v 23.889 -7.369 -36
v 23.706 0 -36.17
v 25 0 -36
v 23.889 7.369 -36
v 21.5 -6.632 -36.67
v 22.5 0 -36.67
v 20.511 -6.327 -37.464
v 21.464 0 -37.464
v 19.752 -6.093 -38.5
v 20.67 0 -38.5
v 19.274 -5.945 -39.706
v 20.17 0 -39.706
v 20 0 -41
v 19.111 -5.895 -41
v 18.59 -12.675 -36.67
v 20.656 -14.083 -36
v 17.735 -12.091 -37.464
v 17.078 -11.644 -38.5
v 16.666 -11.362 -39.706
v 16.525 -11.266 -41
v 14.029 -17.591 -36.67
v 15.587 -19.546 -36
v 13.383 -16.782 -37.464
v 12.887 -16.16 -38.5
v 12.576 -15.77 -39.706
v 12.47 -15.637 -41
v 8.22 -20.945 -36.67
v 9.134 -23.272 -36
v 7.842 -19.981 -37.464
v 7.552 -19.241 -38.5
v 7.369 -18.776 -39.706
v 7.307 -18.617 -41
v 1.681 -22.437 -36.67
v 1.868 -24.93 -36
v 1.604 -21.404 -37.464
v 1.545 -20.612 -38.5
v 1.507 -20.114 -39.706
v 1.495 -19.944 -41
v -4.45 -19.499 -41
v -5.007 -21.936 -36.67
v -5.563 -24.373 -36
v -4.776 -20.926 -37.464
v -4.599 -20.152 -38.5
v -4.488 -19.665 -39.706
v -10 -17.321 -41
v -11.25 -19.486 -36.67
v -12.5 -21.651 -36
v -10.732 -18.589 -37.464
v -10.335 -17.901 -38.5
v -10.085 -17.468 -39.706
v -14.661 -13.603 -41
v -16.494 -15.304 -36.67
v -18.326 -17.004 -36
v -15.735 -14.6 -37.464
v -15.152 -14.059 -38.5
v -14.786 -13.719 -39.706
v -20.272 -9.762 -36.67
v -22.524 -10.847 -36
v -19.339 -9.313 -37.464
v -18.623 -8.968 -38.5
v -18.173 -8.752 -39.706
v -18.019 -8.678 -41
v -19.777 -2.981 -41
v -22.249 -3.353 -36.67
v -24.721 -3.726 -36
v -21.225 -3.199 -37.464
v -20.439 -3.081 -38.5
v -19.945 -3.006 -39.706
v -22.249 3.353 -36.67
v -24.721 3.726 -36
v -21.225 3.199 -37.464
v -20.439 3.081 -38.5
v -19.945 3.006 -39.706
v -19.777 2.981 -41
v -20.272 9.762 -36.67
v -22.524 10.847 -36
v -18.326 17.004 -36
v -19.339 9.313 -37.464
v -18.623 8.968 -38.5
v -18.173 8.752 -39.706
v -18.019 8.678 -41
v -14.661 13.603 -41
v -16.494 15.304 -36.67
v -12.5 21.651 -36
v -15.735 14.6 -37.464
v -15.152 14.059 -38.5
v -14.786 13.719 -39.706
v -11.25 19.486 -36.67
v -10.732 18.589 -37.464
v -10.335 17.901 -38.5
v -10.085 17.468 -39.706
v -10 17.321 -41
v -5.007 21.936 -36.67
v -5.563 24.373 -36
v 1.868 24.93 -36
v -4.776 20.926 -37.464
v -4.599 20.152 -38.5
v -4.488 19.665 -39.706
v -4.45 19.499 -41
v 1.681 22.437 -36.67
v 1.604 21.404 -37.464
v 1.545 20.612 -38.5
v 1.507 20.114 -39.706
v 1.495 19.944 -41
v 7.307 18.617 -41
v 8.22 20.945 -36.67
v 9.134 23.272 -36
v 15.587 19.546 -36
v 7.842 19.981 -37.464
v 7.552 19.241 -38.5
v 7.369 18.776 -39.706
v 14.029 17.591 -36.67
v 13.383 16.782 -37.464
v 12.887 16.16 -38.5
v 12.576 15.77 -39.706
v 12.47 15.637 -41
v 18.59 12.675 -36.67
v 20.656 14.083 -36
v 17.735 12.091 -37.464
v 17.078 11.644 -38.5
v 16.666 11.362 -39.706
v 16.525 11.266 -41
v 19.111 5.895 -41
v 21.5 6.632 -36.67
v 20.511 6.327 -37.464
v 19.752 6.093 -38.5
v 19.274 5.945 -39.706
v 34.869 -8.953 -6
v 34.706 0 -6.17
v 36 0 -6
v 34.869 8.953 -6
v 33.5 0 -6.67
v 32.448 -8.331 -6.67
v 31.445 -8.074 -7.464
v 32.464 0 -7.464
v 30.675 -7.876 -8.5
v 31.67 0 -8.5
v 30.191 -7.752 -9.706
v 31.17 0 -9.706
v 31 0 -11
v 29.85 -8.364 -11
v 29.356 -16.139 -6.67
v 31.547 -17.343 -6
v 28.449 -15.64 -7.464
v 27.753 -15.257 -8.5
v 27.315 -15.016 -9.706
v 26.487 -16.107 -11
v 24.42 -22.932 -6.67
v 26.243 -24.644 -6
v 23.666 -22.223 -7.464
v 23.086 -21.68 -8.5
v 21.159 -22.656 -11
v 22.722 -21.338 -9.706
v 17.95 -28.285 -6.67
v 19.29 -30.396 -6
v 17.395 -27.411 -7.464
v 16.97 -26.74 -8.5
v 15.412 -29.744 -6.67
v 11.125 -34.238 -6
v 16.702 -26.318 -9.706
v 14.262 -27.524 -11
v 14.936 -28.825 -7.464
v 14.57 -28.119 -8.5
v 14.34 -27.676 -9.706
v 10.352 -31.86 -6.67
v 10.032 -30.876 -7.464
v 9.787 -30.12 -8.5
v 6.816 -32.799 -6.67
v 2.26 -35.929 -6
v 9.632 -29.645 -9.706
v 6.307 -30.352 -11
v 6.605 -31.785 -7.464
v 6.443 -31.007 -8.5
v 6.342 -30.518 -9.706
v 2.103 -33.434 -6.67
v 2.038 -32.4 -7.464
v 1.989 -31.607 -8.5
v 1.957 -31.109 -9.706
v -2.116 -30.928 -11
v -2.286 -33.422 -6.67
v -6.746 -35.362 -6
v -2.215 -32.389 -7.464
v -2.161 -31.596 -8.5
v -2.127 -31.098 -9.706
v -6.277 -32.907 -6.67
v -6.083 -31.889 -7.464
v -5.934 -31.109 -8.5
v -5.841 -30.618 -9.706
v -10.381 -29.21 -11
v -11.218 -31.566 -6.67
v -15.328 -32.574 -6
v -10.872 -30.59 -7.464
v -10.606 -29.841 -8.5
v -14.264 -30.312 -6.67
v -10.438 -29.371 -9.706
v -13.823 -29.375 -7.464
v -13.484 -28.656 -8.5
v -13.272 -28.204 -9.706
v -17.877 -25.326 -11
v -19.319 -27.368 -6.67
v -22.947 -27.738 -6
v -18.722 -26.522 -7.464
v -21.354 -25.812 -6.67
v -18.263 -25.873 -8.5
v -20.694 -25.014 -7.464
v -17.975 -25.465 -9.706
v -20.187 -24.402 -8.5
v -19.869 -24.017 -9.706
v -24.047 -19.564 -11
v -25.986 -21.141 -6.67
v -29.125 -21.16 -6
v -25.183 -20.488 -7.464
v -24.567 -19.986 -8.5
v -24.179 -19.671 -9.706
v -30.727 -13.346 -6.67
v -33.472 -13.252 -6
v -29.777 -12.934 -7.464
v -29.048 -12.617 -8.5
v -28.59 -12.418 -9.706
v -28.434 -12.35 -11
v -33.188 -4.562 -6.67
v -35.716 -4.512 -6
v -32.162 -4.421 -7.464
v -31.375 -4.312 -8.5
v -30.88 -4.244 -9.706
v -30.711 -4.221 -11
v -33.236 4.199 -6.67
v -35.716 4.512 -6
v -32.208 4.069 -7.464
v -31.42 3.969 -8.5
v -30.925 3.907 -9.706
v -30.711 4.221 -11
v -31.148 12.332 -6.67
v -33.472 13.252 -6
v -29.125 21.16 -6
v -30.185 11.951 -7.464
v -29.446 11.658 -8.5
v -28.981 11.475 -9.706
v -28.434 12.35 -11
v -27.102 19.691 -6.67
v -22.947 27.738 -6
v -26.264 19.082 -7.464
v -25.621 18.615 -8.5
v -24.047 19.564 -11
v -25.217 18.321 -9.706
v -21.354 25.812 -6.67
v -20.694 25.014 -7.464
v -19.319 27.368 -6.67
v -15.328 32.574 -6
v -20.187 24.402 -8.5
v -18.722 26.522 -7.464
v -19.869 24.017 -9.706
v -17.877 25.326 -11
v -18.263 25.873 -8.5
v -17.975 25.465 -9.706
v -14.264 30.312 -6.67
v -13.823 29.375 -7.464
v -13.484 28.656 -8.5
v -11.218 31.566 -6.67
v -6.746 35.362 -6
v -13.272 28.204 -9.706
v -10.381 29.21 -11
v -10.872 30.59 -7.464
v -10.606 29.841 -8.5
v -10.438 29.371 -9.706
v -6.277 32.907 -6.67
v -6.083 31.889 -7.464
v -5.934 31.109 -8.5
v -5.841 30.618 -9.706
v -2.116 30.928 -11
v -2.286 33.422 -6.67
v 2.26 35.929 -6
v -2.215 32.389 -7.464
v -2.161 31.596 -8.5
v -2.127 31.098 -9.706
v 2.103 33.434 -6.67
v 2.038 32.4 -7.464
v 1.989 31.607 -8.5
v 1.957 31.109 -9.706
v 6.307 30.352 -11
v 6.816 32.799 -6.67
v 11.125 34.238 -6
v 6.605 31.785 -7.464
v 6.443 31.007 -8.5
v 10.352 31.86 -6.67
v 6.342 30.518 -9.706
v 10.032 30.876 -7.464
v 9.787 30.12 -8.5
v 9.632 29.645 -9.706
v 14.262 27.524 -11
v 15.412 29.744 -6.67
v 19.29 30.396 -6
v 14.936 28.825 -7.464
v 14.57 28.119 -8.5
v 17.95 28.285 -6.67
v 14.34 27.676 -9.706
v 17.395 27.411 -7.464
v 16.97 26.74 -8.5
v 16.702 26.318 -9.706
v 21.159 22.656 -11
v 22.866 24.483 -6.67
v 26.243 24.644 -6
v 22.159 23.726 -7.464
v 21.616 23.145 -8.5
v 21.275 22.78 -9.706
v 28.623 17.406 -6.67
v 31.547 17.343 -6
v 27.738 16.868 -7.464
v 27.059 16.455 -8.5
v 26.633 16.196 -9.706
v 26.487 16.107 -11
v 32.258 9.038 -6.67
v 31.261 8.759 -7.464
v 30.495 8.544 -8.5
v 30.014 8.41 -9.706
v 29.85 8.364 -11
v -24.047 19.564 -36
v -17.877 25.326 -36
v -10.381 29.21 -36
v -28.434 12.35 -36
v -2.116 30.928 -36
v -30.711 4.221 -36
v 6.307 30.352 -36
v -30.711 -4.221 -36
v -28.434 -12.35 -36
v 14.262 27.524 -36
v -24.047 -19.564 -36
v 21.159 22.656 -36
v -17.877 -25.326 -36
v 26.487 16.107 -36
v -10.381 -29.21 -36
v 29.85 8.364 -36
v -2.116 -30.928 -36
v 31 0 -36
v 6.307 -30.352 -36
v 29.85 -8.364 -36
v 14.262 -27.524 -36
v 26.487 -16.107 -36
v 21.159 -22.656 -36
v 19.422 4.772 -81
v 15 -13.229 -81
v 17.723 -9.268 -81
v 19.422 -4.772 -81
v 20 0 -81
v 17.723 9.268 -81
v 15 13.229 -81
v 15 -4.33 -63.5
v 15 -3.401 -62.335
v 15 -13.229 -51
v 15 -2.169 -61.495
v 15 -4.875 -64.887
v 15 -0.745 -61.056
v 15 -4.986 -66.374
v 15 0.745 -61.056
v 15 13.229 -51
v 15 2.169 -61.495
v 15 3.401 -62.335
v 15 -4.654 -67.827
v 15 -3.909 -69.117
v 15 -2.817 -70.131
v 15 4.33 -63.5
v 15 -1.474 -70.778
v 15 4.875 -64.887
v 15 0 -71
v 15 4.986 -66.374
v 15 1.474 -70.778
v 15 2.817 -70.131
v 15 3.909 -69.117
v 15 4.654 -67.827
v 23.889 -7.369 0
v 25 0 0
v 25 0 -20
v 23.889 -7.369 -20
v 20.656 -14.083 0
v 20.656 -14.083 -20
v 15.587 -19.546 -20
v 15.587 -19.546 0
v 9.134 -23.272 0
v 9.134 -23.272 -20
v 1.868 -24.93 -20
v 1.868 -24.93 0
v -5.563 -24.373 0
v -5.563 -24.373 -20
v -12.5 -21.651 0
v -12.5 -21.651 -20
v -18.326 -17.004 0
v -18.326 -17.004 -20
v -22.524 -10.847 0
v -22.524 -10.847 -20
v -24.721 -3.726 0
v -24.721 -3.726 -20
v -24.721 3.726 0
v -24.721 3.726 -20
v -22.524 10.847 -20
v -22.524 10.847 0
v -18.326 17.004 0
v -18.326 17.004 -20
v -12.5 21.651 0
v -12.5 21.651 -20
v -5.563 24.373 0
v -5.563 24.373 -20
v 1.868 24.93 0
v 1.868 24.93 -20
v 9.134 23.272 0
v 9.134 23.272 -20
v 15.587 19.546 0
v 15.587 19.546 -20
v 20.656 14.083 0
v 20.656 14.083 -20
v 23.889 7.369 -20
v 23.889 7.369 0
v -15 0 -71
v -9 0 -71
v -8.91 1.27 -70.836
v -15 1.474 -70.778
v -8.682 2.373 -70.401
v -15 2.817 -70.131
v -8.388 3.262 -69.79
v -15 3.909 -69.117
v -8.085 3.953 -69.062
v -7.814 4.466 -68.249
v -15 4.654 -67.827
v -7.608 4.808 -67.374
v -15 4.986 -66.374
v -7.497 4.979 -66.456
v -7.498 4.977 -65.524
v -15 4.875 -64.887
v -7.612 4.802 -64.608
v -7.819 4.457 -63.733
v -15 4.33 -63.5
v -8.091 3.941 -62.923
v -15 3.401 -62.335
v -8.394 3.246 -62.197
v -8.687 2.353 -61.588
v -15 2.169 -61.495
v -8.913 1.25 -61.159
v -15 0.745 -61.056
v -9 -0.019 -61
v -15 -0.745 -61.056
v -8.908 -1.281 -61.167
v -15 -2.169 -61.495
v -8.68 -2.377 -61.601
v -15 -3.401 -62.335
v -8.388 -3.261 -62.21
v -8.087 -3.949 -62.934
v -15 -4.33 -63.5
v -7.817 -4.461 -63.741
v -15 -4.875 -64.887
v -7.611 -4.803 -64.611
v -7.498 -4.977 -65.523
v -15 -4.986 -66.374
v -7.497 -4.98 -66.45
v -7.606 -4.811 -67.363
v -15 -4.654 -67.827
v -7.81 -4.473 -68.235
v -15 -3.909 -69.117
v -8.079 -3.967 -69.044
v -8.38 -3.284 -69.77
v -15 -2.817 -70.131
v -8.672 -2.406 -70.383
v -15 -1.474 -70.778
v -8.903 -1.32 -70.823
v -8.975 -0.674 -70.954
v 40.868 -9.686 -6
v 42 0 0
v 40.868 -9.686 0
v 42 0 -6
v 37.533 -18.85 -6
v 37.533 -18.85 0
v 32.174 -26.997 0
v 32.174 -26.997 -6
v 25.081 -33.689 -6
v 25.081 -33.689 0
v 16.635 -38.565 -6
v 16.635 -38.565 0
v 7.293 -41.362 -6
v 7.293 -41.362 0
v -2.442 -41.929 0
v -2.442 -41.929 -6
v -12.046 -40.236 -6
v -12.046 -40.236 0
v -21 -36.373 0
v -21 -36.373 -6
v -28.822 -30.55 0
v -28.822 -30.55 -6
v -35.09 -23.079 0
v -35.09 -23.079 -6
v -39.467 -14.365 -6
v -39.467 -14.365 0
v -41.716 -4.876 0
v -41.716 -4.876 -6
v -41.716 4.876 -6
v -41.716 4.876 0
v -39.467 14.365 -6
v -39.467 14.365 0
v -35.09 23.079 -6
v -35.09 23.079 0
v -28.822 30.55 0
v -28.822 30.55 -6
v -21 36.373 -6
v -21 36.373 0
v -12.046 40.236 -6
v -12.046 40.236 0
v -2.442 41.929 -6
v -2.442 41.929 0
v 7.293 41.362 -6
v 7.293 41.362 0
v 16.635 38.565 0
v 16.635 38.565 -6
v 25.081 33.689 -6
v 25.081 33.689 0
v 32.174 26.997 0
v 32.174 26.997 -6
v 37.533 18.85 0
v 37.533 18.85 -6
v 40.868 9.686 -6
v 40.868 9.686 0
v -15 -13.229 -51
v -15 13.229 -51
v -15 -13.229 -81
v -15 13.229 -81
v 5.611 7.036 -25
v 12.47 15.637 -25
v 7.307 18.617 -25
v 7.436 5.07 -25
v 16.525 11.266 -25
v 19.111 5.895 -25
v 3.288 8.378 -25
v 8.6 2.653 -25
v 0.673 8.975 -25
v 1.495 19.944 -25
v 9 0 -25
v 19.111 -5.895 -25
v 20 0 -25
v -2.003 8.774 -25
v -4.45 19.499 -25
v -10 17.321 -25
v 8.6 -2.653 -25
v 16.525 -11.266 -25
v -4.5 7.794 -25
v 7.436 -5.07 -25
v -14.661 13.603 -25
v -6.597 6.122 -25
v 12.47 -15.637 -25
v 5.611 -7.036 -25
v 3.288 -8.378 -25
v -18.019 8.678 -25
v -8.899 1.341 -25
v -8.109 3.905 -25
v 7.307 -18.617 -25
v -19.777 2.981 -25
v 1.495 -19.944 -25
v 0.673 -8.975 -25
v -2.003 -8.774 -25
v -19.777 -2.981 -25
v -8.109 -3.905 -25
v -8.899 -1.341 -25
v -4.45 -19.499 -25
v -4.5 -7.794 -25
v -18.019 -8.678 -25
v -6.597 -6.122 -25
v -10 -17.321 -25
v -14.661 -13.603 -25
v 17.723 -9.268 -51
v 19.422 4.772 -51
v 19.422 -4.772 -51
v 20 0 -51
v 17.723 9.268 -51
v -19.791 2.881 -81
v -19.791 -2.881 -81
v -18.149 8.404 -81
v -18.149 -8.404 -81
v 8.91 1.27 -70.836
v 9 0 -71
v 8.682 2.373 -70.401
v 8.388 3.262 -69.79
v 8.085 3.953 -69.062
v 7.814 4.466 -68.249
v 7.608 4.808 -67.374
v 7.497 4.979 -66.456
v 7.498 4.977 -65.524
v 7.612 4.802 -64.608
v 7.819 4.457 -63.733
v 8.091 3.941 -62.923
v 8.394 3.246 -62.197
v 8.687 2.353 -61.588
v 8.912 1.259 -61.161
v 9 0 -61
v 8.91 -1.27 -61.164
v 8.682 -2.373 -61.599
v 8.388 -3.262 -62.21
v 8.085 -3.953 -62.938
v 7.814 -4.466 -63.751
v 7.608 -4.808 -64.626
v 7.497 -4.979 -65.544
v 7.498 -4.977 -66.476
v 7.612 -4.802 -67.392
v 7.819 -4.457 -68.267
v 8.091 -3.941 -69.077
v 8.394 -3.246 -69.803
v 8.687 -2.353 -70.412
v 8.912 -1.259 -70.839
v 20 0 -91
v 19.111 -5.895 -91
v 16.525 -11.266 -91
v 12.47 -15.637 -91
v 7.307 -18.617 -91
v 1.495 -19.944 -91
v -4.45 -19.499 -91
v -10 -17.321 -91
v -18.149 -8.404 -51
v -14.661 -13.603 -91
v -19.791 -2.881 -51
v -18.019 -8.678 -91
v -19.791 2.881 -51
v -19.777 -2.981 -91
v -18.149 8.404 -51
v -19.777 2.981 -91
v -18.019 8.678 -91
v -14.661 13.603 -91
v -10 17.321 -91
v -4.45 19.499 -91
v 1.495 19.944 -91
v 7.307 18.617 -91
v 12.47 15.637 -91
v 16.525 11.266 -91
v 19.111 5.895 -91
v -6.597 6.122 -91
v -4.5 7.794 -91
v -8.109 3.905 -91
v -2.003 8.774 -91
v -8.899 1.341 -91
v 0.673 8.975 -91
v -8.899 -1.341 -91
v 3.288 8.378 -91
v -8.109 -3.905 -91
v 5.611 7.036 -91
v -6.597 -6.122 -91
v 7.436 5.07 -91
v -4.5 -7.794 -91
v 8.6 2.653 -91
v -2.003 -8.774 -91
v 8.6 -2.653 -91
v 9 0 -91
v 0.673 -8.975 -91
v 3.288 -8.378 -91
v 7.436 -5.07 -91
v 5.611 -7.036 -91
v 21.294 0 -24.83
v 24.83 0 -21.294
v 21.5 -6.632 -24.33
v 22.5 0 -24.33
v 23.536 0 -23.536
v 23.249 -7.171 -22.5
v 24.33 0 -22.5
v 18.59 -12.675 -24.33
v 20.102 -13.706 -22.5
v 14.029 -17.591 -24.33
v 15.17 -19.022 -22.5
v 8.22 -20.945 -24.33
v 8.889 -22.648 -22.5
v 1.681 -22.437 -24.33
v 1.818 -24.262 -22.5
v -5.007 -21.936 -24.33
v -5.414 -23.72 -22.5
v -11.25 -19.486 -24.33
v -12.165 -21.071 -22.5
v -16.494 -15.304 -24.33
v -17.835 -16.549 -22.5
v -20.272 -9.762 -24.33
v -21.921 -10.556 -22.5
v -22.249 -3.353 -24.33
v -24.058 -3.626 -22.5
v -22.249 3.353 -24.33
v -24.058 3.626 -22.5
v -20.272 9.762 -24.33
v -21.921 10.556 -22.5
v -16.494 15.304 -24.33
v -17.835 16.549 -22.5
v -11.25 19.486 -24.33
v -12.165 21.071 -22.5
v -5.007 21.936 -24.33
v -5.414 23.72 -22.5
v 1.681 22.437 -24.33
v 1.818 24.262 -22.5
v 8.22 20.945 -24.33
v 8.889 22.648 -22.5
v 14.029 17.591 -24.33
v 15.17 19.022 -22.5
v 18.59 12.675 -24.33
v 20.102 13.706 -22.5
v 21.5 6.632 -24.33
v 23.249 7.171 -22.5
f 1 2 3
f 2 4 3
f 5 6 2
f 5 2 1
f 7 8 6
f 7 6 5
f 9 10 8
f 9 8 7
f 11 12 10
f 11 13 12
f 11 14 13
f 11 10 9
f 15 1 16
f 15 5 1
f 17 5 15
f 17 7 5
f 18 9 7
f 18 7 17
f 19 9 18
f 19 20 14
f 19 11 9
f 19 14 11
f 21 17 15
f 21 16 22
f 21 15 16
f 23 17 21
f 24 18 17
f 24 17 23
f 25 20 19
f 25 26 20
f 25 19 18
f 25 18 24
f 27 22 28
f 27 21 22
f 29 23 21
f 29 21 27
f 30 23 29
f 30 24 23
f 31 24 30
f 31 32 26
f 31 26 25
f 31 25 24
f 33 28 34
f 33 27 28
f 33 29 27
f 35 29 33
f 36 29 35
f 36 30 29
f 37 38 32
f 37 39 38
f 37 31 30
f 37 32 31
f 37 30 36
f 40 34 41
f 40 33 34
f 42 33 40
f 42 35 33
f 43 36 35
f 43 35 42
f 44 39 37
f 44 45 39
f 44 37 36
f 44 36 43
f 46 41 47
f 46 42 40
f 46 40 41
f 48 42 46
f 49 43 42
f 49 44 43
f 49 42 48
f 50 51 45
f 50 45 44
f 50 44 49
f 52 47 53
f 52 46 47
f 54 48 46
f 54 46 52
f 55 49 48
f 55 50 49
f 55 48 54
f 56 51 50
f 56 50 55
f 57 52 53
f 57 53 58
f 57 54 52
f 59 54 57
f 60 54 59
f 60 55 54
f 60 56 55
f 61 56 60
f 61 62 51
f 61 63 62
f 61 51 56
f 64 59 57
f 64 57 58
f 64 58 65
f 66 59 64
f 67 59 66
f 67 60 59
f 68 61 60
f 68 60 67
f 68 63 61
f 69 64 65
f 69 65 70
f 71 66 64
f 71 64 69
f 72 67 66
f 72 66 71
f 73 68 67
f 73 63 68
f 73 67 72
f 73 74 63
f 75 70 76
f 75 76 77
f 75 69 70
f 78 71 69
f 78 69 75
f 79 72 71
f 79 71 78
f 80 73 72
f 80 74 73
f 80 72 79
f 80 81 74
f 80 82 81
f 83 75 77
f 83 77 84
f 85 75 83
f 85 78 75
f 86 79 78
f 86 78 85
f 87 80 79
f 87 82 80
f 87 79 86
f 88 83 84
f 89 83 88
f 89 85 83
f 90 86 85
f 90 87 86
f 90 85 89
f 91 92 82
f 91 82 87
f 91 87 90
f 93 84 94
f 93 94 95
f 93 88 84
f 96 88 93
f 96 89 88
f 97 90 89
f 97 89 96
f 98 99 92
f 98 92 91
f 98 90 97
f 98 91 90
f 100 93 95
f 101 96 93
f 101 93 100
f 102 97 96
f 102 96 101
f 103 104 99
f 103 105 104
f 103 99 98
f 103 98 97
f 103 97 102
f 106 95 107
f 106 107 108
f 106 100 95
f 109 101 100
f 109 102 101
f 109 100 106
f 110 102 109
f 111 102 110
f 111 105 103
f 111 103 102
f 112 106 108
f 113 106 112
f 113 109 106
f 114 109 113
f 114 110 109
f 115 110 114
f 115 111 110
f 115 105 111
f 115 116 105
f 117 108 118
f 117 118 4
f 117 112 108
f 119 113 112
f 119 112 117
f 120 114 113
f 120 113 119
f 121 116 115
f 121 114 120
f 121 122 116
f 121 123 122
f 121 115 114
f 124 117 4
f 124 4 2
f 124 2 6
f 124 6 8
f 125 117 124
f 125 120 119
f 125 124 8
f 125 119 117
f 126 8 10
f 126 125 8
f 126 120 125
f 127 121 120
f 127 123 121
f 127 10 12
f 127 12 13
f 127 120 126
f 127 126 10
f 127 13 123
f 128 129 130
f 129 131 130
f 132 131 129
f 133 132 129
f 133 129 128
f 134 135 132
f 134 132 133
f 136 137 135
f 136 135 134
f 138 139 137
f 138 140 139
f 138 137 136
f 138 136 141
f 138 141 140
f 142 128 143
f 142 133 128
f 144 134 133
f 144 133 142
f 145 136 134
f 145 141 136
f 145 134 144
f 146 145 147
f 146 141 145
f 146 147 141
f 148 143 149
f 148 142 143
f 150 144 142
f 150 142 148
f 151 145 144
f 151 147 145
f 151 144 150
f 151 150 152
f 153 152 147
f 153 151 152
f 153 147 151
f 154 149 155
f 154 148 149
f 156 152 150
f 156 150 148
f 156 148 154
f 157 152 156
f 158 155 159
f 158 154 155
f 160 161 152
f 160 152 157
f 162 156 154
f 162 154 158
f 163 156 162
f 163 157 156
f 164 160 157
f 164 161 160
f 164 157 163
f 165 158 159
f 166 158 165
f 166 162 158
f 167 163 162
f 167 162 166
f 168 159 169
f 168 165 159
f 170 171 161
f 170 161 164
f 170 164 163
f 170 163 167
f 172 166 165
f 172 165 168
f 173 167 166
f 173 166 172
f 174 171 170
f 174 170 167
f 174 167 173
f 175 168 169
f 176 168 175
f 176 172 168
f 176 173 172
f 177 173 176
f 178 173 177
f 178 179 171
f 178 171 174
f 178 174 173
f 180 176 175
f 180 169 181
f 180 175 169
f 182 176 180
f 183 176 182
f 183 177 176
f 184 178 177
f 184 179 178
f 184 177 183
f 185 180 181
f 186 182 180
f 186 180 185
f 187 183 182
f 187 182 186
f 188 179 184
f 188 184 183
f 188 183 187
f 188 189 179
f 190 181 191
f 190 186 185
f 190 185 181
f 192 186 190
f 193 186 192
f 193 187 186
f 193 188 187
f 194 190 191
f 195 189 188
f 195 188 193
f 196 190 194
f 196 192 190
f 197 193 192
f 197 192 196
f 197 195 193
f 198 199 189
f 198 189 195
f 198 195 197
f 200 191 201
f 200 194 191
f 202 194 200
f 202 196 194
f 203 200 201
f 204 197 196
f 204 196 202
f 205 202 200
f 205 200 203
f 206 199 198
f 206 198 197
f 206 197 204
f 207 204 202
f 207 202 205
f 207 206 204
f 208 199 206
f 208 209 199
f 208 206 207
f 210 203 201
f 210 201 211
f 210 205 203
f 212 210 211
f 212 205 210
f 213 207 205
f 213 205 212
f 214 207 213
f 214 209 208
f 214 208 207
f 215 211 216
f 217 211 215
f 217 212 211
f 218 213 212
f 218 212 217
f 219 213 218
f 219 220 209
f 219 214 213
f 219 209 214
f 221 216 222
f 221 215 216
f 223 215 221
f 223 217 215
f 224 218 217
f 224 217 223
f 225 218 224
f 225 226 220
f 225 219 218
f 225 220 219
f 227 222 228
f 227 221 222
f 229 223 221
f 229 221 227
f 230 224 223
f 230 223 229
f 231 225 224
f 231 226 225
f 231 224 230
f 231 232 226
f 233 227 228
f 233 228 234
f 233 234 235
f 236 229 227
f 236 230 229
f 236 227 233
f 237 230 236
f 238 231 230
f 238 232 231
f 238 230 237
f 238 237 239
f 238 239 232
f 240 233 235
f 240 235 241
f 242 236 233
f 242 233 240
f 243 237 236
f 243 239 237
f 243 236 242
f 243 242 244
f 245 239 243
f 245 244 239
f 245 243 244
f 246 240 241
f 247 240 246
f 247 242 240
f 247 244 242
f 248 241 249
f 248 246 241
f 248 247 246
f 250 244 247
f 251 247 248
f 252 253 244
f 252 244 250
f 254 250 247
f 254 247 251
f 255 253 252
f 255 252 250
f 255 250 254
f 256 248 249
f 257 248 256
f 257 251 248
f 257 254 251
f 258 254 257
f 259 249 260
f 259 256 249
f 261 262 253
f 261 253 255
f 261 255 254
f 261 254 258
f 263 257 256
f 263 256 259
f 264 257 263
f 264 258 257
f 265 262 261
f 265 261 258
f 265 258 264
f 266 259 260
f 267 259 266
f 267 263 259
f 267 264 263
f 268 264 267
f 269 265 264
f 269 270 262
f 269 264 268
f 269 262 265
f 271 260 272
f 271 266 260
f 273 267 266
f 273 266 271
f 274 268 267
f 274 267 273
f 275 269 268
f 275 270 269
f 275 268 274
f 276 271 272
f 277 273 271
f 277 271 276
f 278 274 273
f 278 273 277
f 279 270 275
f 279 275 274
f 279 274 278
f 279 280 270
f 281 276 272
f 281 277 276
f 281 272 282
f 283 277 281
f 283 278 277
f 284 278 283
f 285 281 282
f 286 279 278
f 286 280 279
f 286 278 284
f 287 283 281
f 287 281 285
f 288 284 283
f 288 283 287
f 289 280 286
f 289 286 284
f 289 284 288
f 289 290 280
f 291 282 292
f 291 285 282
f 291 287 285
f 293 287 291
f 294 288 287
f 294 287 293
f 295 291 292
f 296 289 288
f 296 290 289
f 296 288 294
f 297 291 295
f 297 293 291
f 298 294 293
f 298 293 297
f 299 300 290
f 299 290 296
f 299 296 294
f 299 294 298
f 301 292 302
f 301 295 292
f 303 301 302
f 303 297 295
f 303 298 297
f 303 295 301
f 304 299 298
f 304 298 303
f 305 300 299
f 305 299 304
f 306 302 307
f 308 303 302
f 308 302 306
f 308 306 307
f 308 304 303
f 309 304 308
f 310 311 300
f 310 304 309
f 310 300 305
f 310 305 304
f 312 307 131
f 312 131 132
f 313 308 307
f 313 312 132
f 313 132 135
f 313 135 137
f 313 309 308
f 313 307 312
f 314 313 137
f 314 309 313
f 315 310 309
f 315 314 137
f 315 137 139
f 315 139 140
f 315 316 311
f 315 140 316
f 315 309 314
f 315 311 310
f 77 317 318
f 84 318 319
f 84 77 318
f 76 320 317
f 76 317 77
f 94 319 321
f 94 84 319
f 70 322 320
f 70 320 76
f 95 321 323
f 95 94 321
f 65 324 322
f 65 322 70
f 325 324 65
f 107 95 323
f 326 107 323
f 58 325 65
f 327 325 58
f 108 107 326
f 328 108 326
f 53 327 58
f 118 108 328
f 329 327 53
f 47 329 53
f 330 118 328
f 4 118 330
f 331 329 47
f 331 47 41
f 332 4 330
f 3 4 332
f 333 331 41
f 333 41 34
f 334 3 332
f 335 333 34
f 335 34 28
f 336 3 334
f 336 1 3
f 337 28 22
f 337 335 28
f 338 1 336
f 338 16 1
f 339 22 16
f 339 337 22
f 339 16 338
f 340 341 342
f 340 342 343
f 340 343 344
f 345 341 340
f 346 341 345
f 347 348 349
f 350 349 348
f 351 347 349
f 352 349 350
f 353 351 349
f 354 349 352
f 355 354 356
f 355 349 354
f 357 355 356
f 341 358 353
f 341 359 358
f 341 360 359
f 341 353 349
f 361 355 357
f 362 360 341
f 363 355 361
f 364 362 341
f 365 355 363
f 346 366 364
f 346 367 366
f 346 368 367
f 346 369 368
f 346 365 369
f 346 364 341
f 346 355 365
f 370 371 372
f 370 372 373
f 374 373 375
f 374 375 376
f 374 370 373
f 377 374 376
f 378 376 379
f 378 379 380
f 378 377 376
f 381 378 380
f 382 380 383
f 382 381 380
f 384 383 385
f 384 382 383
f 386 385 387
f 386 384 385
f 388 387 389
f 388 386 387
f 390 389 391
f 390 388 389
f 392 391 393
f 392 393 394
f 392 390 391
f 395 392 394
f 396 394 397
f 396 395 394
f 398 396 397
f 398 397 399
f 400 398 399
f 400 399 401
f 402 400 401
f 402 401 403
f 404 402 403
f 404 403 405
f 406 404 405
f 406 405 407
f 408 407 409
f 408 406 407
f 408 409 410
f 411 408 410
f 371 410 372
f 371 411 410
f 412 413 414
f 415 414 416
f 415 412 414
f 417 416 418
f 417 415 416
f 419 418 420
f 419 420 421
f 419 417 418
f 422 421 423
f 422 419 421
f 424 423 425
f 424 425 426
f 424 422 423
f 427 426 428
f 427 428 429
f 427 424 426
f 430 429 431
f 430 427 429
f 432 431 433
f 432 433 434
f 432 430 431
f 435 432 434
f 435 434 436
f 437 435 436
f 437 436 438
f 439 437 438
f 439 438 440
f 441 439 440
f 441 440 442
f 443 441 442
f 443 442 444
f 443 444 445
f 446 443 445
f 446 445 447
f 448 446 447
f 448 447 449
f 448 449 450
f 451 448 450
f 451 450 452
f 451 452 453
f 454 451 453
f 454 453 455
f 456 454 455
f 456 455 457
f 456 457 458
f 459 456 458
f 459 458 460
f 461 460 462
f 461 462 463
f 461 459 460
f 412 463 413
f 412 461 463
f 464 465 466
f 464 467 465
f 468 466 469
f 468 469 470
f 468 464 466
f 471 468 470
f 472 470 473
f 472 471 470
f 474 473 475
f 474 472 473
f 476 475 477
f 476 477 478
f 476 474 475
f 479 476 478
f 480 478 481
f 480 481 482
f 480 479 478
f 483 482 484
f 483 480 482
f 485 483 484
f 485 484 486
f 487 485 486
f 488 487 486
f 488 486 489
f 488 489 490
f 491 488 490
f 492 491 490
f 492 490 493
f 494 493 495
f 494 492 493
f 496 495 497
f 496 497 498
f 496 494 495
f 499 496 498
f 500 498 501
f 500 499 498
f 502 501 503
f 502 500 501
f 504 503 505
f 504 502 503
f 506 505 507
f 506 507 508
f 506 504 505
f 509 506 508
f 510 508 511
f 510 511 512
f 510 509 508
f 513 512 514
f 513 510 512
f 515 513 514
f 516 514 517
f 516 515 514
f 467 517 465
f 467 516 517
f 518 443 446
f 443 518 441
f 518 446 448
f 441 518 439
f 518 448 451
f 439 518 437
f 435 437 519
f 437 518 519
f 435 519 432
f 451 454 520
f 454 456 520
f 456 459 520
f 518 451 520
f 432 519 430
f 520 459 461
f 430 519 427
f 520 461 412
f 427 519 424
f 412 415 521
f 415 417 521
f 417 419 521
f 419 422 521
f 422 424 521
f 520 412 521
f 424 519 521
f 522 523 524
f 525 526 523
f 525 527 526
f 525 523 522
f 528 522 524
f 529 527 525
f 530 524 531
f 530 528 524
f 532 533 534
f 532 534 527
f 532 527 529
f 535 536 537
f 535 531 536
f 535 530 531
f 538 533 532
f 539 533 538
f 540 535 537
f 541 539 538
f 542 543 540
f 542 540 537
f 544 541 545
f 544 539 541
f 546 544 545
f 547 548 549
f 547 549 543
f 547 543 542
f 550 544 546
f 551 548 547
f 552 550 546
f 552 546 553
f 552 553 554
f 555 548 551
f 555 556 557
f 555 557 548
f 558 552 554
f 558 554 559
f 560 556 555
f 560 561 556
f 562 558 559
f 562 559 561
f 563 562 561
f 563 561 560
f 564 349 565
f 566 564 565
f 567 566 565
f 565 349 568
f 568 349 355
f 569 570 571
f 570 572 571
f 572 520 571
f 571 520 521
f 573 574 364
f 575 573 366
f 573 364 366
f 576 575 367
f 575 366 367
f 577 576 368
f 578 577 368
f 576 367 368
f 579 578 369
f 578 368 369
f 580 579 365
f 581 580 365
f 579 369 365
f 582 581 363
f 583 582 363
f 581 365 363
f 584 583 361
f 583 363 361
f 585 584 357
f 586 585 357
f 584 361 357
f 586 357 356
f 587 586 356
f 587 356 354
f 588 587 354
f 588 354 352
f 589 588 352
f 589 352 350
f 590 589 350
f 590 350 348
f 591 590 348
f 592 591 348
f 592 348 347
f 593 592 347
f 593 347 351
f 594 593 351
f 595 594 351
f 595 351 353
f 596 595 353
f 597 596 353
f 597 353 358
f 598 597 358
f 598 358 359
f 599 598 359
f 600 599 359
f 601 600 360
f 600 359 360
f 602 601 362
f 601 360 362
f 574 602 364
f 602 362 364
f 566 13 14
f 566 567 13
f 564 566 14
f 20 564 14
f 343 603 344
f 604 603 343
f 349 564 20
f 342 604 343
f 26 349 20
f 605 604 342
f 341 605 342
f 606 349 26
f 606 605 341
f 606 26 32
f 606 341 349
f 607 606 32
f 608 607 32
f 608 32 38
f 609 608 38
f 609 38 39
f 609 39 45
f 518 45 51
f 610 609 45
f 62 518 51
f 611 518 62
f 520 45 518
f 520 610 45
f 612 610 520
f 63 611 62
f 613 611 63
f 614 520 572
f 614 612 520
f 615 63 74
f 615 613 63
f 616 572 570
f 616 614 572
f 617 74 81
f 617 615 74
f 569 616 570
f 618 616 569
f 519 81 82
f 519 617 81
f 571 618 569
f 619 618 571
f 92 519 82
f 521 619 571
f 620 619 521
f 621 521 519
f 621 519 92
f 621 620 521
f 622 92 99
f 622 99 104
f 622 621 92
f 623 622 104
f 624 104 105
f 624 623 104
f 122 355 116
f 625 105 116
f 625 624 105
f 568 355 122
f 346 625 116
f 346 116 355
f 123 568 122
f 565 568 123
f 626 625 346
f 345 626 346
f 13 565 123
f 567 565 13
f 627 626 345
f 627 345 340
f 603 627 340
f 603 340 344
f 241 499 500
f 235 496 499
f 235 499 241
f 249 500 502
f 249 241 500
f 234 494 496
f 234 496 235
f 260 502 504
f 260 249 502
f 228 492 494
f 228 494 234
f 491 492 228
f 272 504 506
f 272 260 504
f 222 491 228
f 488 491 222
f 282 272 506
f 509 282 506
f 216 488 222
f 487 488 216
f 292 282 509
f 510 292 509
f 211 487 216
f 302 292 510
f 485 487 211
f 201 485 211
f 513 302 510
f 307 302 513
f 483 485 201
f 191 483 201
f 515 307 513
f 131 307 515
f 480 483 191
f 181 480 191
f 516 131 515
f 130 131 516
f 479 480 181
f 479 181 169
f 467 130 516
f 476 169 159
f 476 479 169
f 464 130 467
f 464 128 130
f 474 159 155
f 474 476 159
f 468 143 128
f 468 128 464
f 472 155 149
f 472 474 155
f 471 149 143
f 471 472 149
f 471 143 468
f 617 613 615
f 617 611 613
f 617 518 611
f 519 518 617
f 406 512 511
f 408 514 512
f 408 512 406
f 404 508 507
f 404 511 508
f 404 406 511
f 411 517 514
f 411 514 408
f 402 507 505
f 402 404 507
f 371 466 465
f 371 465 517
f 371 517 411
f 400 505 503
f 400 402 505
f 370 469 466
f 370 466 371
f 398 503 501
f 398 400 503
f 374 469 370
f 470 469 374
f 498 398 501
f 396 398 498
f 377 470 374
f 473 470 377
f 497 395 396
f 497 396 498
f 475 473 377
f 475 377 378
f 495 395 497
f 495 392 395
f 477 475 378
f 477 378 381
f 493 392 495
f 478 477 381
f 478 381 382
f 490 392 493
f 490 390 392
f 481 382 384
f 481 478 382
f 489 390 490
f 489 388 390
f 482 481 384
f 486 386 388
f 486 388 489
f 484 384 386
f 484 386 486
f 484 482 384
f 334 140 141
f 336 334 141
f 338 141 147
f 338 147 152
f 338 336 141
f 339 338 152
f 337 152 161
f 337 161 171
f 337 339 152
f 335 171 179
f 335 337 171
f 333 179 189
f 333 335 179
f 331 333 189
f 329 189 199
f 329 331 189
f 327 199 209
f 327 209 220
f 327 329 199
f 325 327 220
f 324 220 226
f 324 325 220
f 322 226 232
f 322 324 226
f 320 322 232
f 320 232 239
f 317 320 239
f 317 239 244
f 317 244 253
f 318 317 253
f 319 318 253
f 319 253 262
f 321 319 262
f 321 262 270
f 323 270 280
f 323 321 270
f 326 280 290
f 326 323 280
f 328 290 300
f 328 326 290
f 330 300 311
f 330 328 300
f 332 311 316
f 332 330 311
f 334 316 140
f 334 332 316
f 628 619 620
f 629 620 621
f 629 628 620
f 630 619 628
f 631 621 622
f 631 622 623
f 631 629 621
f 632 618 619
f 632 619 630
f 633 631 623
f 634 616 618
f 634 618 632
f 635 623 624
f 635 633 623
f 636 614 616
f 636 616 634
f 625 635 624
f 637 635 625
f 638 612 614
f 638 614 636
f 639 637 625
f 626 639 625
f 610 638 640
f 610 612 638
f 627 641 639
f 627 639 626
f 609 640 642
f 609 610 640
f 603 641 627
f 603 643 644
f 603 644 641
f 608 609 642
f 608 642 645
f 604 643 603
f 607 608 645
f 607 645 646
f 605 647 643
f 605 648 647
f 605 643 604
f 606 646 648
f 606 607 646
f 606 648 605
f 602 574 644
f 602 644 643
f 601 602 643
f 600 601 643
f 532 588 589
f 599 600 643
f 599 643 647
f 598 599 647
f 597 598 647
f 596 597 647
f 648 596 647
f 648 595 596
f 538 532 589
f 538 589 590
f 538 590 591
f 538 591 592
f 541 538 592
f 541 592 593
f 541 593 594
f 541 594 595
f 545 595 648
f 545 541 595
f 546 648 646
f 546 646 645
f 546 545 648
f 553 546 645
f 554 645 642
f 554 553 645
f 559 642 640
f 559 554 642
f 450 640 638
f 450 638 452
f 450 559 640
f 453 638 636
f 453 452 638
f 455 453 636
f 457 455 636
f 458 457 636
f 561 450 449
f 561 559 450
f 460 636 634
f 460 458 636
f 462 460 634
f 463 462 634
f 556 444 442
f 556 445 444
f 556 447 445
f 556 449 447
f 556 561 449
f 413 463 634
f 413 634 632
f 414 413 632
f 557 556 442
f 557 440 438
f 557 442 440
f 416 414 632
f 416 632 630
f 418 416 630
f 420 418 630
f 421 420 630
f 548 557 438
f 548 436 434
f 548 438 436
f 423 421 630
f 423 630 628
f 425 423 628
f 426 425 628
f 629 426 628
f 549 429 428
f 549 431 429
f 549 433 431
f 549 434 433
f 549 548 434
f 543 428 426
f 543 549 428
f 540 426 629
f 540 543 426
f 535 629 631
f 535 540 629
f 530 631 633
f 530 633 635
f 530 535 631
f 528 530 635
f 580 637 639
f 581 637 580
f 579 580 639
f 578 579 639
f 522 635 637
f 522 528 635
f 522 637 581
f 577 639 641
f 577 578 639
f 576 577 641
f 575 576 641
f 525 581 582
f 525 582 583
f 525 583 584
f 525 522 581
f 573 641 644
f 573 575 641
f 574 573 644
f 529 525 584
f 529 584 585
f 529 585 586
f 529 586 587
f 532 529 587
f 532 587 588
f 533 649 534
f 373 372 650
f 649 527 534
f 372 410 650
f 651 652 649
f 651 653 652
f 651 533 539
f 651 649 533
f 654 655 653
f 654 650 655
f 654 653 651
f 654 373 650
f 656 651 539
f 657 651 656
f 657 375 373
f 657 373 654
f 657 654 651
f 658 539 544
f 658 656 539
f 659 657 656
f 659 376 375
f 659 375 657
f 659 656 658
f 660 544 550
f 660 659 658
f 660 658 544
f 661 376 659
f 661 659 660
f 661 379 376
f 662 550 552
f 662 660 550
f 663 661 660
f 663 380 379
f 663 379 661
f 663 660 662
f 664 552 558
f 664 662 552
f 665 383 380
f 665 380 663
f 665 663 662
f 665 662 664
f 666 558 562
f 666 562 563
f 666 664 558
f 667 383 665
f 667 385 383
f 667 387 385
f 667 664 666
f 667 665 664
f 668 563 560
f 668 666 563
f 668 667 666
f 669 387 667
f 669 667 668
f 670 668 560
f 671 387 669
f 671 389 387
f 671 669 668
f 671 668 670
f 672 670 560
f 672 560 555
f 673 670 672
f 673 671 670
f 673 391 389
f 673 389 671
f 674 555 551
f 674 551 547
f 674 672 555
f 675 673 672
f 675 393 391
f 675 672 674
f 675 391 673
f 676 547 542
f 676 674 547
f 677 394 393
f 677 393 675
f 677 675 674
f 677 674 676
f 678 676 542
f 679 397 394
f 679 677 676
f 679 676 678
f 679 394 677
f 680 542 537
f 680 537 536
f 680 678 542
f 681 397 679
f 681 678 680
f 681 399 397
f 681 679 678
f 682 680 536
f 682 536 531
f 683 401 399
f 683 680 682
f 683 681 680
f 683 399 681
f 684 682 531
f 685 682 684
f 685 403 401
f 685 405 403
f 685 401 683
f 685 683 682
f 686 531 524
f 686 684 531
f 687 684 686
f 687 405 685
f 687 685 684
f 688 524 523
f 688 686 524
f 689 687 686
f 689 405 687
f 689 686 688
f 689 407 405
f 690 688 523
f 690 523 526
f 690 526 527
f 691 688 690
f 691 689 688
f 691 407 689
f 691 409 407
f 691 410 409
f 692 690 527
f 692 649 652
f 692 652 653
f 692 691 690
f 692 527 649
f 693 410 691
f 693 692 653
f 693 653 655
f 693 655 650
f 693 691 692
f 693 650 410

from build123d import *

# Parameters (mm, degrees)
REDONDEO1_R                            = 5
CORTAR_EXTRUIR1_REACH                  = 110.669
CORTAR_EXTRUIR1_END_RADIUS             = 20
CROQUIS2_W                             = 5
CROQUIS2_H                             = 30
CORTAR_EXTRUIR1_DIRECTION_2_REACH      = 110.669
CORTAR_EXTRUIR1_DIRECTION_2_END_RADIUS = 20
CORTAR_EXTRUIR3_REACH                  = 117.3
CORTAR_EXTRUIR3_END_RADIUS             = 9
CROQUIS3_R                             = 5


with BuildPart() as part:
    # Croquis1 → Revolución1 (revolve)
    with BuildSketch(Plane(origin=(0, 0, 0), x_dir=(1, 0, 0), z_dir=(0, 1, 0))):
        Polygon((25, 0), (42, 0), (42, 6), (31, 6), (31, 36), (20, 36), (20, 91), (9, 91), (9, 25), (25, 25), align=None)
    revolve(axis=Axis((0, 0, 3.677633668), (0, 0, -1)))

    # Redondeo1
    redondeo1_edges = [part.edges().sort_by_distance(p)[0] for p in [
        (-25, 0, -25),
        (-20, 0, -36),
        (-31, 0, -6),
    ]]
    fillet(redondeo1_edges, radius=REDONDEO1_R)

    # Cortar-Extruir1: up to this cylinder (the profile starts inside it)
    cortar_extruir1_end = Plane(origin=(0, 0, -66), z_dir=(0, 0, 1)) * Cylinder(CORTAR_EXTRUIR1_END_RADIUS, 262.338, mode=Mode.PRIVATE)
    # Croquis2 → Cortar-Extruir1 (cut, up to the surface)
    with BuildSketch(Plane(origin=(0, 0, 0), x_dir=(1, 0, 0), z_dir=(0, 1, 0)), mode=Mode.PRIVATE) as cortar_extruir1_sk1:
        with Locations((17.5, 66)):
            Rectangle(CROQUIS2_W, CROQUIS2_H)
    cortar_extruir1_tool1 = extrude(cortar_extruir1_sk1.sketch, amount=-CORTAR_EXTRUIR1_REACH, mode=Mode.PRIVATE) & cortar_extruir1_end
    cortar_extruir1 = cortar_extruir1_tool1.solids().sort_by_distance((17.5, 0, -66))[0]
    add(cortar_extruir1, mode=Mode.SUBTRACT)

    # Cortar-Extruir1 direction 2: up to this cylinder (the profile starts inside it)
    cortar_extruir1_direction_2_end = Plane(origin=(0, 0, -66), z_dir=(0, 0, 1)) * Cylinder(CORTAR_EXTRUIR1_DIRECTION_2_END_RADIUS, 262.338, mode=Mode.PRIVATE)
    # Croquis2 → Cortar-Extruir1 direction 2 (cut, up to the surface)
    with BuildSketch(Plane(origin=(0, 0, 0), x_dir=(1, 0, 0), z_dir=(0, 1, 0)), mode=Mode.PRIVATE) as cortar_extruir1_direction_2_sk1:
        with Locations((17.5, 66)):
            Rectangle(CROQUIS2_W, CROQUIS2_H)
    cortar_extruir1_direction_2_tool1 = extrude(cortar_extruir1_direction_2_sk1.sketch, amount=CORTAR_EXTRUIR1_DIRECTION_2_REACH, mode=Mode.PRIVATE) & cortar_extruir1_direction_2_end
    cortar_extruir1_direction_2 = cortar_extruir1_direction_2_tool1.solids().sort_by_distance((17.5, 0, -66))[0]
    add(cortar_extruir1_direction_2, mode=Mode.SUBTRACT)
    cortar_extruir1 = cortar_extruir1 + cortar_extruir1_direction_2  # both directions under the feature's name, for the pattern or mirror that repeats it

    # Cortar-Extruir3: up to this cylinder (the profile starts outside it)
    cortar_extruir3_end = Plane(origin=(0, 0, -66), z_dir=(0, 0, 1)) * Cylinder(CORTAR_EXTRUIR3_END_RADIUS, 253.6, mode=Mode.PRIVATE)
    # Croquis3 → Cortar-Extruir3 (cut, up to the surface)
    with BuildSketch(Plane(origin=(15, 0, 0), x_dir=(0, 0, -1), z_dir=(1, 0, 0)), mode=Mode.PRIVATE) as cortar_extruir3_sk1:
        with Locations((66, 0)):
            Circle(CROQUIS3_R)
    cortar_extruir3_tool1 = extrude(cortar_extruir3_sk1.sketch, amount=-CORTAR_EXTRUIR3_REACH, mode=Mode.PRIVATE) - cortar_extruir3_end
    cortar_extruir3 = cortar_extruir3_tool1.solids().sort_by_distance((15, 0, -66))[0]
    add(cortar_extruir3, mode=Mode.SUBTRACT)

    # Simetría2: Cortar-Extruir1, Cortar-Extruir3 across plane
    add(cortar_extruir1.mirror(Plane(origin=(0, 0, 0), x_dir=(0, 0, 1), z_dir=(1, 0, 0))), mode=Mode.SUBTRACT)
    add(cortar_extruir3.mirror(Plane(origin=(0, 0, 0), x_dir=(0, 0, 1), z_dir=(1, 0, 0))), mode=Mode.SUBTRACT)


solid = part.part
